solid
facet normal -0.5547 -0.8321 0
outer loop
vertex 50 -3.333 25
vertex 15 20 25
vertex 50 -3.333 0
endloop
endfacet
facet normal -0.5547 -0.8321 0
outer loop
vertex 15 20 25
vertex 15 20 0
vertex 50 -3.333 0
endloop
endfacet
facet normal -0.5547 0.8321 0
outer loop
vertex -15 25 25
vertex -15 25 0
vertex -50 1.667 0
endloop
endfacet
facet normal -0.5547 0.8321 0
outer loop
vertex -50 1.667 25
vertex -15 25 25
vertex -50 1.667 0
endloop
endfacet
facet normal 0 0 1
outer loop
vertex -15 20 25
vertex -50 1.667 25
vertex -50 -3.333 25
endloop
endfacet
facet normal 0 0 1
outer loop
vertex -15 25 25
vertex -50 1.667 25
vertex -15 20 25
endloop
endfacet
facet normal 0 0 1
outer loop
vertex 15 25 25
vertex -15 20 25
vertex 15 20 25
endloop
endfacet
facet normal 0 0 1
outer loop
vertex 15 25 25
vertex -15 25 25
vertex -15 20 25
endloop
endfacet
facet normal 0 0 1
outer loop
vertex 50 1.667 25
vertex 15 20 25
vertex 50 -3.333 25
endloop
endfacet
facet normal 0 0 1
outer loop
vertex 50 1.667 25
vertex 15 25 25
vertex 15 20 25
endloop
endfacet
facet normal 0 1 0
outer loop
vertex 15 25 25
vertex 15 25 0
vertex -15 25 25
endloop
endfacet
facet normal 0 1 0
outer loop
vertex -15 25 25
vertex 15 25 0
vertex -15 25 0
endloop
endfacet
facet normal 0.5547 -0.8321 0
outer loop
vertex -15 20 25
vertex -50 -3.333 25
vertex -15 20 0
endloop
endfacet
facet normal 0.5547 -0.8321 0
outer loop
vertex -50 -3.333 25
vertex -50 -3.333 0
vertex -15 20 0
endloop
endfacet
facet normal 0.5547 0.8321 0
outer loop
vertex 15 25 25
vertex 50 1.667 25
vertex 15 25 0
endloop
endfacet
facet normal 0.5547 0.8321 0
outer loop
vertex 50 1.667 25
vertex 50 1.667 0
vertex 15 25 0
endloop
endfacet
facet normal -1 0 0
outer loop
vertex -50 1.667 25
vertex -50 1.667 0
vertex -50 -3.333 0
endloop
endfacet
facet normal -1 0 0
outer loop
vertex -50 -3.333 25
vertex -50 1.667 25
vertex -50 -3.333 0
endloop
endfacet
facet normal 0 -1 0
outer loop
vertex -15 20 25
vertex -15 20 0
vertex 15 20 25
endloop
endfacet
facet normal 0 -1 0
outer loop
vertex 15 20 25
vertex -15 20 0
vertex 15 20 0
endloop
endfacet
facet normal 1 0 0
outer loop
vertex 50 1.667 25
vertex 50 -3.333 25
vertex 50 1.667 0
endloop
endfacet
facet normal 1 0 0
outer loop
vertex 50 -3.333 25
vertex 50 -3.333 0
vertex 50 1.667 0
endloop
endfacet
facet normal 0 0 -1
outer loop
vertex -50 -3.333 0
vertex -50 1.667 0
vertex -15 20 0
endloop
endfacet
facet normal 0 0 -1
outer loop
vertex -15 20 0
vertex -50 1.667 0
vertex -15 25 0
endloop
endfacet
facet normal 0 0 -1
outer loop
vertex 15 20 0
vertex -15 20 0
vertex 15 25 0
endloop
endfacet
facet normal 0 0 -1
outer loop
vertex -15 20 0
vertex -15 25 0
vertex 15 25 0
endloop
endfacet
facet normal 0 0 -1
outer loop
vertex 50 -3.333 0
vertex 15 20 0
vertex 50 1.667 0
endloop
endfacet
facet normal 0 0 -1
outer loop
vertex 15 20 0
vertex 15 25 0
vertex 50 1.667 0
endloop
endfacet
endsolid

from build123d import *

# Parameters (mm, degrees)
SKETCH1_W           = 100
SKETCH1_H           = 50
BOSS_EXTRUDE1_DEPTH = 5
CUT_EXTRUDE1_DEPTH  = 57.124860802
CUT_EXTRUDE2_DEPTH  = 57.124860802
BOSS_EXTRUDE2_DEPTH = 20


with BuildPart() as part:
    # Sketch1 → Boss-Extrude1 (new body)
    with BuildSketch(Plane.XY):
        Rectangle(SKETCH1_W, SKETCH1_H)
    extrude(amount=BOSS_EXTRUDE1_DEPTH)

    # Sketch2 → Cut-Extrude1 (cut, through all)
    with BuildSketch(Plane(origin=(0, 0, 0), x_dir=(-1, 0, 0), z_dir=(0, 0, -1))):
        Polygon((-50, 1.666666667), (-15, 25), (-50, 25), align=None)
        Polygon((50, 25), (15, 25), (50, 1.666666667), align=None)
    extrude(amount=-CUT_EXTRUDE1_DEPTH, mode=Mode.SUBTRACT)

    # Sketch3 → Cut-Extrude2 (cut, through all)
    with BuildSketch(Plane.XY.offset(5)):
        Polygon((-50, -3.333333333), (-15, 20), (15, 20), (50, -3.333333333), (50, -25), (-50, -25), align=None)
    extrude(amount=-CUT_EXTRUDE2_DEPTH, mode=Mode.SUBTRACT)

    # Sketch4 → Boss-Extrude2 (add)
    with BuildSketch(Plane.XY.offset(5)):
        Polygon((-50, 1.666666667), (-50, -3.333333333), (-15, 20), (15, 20), (50, -3.333333333), (50, 1.666666667), (15, 25), (-15, 25), align=None)
    extrude(amount=BOSS_EXTRUDE2_DEPTH)


solid = part.part
